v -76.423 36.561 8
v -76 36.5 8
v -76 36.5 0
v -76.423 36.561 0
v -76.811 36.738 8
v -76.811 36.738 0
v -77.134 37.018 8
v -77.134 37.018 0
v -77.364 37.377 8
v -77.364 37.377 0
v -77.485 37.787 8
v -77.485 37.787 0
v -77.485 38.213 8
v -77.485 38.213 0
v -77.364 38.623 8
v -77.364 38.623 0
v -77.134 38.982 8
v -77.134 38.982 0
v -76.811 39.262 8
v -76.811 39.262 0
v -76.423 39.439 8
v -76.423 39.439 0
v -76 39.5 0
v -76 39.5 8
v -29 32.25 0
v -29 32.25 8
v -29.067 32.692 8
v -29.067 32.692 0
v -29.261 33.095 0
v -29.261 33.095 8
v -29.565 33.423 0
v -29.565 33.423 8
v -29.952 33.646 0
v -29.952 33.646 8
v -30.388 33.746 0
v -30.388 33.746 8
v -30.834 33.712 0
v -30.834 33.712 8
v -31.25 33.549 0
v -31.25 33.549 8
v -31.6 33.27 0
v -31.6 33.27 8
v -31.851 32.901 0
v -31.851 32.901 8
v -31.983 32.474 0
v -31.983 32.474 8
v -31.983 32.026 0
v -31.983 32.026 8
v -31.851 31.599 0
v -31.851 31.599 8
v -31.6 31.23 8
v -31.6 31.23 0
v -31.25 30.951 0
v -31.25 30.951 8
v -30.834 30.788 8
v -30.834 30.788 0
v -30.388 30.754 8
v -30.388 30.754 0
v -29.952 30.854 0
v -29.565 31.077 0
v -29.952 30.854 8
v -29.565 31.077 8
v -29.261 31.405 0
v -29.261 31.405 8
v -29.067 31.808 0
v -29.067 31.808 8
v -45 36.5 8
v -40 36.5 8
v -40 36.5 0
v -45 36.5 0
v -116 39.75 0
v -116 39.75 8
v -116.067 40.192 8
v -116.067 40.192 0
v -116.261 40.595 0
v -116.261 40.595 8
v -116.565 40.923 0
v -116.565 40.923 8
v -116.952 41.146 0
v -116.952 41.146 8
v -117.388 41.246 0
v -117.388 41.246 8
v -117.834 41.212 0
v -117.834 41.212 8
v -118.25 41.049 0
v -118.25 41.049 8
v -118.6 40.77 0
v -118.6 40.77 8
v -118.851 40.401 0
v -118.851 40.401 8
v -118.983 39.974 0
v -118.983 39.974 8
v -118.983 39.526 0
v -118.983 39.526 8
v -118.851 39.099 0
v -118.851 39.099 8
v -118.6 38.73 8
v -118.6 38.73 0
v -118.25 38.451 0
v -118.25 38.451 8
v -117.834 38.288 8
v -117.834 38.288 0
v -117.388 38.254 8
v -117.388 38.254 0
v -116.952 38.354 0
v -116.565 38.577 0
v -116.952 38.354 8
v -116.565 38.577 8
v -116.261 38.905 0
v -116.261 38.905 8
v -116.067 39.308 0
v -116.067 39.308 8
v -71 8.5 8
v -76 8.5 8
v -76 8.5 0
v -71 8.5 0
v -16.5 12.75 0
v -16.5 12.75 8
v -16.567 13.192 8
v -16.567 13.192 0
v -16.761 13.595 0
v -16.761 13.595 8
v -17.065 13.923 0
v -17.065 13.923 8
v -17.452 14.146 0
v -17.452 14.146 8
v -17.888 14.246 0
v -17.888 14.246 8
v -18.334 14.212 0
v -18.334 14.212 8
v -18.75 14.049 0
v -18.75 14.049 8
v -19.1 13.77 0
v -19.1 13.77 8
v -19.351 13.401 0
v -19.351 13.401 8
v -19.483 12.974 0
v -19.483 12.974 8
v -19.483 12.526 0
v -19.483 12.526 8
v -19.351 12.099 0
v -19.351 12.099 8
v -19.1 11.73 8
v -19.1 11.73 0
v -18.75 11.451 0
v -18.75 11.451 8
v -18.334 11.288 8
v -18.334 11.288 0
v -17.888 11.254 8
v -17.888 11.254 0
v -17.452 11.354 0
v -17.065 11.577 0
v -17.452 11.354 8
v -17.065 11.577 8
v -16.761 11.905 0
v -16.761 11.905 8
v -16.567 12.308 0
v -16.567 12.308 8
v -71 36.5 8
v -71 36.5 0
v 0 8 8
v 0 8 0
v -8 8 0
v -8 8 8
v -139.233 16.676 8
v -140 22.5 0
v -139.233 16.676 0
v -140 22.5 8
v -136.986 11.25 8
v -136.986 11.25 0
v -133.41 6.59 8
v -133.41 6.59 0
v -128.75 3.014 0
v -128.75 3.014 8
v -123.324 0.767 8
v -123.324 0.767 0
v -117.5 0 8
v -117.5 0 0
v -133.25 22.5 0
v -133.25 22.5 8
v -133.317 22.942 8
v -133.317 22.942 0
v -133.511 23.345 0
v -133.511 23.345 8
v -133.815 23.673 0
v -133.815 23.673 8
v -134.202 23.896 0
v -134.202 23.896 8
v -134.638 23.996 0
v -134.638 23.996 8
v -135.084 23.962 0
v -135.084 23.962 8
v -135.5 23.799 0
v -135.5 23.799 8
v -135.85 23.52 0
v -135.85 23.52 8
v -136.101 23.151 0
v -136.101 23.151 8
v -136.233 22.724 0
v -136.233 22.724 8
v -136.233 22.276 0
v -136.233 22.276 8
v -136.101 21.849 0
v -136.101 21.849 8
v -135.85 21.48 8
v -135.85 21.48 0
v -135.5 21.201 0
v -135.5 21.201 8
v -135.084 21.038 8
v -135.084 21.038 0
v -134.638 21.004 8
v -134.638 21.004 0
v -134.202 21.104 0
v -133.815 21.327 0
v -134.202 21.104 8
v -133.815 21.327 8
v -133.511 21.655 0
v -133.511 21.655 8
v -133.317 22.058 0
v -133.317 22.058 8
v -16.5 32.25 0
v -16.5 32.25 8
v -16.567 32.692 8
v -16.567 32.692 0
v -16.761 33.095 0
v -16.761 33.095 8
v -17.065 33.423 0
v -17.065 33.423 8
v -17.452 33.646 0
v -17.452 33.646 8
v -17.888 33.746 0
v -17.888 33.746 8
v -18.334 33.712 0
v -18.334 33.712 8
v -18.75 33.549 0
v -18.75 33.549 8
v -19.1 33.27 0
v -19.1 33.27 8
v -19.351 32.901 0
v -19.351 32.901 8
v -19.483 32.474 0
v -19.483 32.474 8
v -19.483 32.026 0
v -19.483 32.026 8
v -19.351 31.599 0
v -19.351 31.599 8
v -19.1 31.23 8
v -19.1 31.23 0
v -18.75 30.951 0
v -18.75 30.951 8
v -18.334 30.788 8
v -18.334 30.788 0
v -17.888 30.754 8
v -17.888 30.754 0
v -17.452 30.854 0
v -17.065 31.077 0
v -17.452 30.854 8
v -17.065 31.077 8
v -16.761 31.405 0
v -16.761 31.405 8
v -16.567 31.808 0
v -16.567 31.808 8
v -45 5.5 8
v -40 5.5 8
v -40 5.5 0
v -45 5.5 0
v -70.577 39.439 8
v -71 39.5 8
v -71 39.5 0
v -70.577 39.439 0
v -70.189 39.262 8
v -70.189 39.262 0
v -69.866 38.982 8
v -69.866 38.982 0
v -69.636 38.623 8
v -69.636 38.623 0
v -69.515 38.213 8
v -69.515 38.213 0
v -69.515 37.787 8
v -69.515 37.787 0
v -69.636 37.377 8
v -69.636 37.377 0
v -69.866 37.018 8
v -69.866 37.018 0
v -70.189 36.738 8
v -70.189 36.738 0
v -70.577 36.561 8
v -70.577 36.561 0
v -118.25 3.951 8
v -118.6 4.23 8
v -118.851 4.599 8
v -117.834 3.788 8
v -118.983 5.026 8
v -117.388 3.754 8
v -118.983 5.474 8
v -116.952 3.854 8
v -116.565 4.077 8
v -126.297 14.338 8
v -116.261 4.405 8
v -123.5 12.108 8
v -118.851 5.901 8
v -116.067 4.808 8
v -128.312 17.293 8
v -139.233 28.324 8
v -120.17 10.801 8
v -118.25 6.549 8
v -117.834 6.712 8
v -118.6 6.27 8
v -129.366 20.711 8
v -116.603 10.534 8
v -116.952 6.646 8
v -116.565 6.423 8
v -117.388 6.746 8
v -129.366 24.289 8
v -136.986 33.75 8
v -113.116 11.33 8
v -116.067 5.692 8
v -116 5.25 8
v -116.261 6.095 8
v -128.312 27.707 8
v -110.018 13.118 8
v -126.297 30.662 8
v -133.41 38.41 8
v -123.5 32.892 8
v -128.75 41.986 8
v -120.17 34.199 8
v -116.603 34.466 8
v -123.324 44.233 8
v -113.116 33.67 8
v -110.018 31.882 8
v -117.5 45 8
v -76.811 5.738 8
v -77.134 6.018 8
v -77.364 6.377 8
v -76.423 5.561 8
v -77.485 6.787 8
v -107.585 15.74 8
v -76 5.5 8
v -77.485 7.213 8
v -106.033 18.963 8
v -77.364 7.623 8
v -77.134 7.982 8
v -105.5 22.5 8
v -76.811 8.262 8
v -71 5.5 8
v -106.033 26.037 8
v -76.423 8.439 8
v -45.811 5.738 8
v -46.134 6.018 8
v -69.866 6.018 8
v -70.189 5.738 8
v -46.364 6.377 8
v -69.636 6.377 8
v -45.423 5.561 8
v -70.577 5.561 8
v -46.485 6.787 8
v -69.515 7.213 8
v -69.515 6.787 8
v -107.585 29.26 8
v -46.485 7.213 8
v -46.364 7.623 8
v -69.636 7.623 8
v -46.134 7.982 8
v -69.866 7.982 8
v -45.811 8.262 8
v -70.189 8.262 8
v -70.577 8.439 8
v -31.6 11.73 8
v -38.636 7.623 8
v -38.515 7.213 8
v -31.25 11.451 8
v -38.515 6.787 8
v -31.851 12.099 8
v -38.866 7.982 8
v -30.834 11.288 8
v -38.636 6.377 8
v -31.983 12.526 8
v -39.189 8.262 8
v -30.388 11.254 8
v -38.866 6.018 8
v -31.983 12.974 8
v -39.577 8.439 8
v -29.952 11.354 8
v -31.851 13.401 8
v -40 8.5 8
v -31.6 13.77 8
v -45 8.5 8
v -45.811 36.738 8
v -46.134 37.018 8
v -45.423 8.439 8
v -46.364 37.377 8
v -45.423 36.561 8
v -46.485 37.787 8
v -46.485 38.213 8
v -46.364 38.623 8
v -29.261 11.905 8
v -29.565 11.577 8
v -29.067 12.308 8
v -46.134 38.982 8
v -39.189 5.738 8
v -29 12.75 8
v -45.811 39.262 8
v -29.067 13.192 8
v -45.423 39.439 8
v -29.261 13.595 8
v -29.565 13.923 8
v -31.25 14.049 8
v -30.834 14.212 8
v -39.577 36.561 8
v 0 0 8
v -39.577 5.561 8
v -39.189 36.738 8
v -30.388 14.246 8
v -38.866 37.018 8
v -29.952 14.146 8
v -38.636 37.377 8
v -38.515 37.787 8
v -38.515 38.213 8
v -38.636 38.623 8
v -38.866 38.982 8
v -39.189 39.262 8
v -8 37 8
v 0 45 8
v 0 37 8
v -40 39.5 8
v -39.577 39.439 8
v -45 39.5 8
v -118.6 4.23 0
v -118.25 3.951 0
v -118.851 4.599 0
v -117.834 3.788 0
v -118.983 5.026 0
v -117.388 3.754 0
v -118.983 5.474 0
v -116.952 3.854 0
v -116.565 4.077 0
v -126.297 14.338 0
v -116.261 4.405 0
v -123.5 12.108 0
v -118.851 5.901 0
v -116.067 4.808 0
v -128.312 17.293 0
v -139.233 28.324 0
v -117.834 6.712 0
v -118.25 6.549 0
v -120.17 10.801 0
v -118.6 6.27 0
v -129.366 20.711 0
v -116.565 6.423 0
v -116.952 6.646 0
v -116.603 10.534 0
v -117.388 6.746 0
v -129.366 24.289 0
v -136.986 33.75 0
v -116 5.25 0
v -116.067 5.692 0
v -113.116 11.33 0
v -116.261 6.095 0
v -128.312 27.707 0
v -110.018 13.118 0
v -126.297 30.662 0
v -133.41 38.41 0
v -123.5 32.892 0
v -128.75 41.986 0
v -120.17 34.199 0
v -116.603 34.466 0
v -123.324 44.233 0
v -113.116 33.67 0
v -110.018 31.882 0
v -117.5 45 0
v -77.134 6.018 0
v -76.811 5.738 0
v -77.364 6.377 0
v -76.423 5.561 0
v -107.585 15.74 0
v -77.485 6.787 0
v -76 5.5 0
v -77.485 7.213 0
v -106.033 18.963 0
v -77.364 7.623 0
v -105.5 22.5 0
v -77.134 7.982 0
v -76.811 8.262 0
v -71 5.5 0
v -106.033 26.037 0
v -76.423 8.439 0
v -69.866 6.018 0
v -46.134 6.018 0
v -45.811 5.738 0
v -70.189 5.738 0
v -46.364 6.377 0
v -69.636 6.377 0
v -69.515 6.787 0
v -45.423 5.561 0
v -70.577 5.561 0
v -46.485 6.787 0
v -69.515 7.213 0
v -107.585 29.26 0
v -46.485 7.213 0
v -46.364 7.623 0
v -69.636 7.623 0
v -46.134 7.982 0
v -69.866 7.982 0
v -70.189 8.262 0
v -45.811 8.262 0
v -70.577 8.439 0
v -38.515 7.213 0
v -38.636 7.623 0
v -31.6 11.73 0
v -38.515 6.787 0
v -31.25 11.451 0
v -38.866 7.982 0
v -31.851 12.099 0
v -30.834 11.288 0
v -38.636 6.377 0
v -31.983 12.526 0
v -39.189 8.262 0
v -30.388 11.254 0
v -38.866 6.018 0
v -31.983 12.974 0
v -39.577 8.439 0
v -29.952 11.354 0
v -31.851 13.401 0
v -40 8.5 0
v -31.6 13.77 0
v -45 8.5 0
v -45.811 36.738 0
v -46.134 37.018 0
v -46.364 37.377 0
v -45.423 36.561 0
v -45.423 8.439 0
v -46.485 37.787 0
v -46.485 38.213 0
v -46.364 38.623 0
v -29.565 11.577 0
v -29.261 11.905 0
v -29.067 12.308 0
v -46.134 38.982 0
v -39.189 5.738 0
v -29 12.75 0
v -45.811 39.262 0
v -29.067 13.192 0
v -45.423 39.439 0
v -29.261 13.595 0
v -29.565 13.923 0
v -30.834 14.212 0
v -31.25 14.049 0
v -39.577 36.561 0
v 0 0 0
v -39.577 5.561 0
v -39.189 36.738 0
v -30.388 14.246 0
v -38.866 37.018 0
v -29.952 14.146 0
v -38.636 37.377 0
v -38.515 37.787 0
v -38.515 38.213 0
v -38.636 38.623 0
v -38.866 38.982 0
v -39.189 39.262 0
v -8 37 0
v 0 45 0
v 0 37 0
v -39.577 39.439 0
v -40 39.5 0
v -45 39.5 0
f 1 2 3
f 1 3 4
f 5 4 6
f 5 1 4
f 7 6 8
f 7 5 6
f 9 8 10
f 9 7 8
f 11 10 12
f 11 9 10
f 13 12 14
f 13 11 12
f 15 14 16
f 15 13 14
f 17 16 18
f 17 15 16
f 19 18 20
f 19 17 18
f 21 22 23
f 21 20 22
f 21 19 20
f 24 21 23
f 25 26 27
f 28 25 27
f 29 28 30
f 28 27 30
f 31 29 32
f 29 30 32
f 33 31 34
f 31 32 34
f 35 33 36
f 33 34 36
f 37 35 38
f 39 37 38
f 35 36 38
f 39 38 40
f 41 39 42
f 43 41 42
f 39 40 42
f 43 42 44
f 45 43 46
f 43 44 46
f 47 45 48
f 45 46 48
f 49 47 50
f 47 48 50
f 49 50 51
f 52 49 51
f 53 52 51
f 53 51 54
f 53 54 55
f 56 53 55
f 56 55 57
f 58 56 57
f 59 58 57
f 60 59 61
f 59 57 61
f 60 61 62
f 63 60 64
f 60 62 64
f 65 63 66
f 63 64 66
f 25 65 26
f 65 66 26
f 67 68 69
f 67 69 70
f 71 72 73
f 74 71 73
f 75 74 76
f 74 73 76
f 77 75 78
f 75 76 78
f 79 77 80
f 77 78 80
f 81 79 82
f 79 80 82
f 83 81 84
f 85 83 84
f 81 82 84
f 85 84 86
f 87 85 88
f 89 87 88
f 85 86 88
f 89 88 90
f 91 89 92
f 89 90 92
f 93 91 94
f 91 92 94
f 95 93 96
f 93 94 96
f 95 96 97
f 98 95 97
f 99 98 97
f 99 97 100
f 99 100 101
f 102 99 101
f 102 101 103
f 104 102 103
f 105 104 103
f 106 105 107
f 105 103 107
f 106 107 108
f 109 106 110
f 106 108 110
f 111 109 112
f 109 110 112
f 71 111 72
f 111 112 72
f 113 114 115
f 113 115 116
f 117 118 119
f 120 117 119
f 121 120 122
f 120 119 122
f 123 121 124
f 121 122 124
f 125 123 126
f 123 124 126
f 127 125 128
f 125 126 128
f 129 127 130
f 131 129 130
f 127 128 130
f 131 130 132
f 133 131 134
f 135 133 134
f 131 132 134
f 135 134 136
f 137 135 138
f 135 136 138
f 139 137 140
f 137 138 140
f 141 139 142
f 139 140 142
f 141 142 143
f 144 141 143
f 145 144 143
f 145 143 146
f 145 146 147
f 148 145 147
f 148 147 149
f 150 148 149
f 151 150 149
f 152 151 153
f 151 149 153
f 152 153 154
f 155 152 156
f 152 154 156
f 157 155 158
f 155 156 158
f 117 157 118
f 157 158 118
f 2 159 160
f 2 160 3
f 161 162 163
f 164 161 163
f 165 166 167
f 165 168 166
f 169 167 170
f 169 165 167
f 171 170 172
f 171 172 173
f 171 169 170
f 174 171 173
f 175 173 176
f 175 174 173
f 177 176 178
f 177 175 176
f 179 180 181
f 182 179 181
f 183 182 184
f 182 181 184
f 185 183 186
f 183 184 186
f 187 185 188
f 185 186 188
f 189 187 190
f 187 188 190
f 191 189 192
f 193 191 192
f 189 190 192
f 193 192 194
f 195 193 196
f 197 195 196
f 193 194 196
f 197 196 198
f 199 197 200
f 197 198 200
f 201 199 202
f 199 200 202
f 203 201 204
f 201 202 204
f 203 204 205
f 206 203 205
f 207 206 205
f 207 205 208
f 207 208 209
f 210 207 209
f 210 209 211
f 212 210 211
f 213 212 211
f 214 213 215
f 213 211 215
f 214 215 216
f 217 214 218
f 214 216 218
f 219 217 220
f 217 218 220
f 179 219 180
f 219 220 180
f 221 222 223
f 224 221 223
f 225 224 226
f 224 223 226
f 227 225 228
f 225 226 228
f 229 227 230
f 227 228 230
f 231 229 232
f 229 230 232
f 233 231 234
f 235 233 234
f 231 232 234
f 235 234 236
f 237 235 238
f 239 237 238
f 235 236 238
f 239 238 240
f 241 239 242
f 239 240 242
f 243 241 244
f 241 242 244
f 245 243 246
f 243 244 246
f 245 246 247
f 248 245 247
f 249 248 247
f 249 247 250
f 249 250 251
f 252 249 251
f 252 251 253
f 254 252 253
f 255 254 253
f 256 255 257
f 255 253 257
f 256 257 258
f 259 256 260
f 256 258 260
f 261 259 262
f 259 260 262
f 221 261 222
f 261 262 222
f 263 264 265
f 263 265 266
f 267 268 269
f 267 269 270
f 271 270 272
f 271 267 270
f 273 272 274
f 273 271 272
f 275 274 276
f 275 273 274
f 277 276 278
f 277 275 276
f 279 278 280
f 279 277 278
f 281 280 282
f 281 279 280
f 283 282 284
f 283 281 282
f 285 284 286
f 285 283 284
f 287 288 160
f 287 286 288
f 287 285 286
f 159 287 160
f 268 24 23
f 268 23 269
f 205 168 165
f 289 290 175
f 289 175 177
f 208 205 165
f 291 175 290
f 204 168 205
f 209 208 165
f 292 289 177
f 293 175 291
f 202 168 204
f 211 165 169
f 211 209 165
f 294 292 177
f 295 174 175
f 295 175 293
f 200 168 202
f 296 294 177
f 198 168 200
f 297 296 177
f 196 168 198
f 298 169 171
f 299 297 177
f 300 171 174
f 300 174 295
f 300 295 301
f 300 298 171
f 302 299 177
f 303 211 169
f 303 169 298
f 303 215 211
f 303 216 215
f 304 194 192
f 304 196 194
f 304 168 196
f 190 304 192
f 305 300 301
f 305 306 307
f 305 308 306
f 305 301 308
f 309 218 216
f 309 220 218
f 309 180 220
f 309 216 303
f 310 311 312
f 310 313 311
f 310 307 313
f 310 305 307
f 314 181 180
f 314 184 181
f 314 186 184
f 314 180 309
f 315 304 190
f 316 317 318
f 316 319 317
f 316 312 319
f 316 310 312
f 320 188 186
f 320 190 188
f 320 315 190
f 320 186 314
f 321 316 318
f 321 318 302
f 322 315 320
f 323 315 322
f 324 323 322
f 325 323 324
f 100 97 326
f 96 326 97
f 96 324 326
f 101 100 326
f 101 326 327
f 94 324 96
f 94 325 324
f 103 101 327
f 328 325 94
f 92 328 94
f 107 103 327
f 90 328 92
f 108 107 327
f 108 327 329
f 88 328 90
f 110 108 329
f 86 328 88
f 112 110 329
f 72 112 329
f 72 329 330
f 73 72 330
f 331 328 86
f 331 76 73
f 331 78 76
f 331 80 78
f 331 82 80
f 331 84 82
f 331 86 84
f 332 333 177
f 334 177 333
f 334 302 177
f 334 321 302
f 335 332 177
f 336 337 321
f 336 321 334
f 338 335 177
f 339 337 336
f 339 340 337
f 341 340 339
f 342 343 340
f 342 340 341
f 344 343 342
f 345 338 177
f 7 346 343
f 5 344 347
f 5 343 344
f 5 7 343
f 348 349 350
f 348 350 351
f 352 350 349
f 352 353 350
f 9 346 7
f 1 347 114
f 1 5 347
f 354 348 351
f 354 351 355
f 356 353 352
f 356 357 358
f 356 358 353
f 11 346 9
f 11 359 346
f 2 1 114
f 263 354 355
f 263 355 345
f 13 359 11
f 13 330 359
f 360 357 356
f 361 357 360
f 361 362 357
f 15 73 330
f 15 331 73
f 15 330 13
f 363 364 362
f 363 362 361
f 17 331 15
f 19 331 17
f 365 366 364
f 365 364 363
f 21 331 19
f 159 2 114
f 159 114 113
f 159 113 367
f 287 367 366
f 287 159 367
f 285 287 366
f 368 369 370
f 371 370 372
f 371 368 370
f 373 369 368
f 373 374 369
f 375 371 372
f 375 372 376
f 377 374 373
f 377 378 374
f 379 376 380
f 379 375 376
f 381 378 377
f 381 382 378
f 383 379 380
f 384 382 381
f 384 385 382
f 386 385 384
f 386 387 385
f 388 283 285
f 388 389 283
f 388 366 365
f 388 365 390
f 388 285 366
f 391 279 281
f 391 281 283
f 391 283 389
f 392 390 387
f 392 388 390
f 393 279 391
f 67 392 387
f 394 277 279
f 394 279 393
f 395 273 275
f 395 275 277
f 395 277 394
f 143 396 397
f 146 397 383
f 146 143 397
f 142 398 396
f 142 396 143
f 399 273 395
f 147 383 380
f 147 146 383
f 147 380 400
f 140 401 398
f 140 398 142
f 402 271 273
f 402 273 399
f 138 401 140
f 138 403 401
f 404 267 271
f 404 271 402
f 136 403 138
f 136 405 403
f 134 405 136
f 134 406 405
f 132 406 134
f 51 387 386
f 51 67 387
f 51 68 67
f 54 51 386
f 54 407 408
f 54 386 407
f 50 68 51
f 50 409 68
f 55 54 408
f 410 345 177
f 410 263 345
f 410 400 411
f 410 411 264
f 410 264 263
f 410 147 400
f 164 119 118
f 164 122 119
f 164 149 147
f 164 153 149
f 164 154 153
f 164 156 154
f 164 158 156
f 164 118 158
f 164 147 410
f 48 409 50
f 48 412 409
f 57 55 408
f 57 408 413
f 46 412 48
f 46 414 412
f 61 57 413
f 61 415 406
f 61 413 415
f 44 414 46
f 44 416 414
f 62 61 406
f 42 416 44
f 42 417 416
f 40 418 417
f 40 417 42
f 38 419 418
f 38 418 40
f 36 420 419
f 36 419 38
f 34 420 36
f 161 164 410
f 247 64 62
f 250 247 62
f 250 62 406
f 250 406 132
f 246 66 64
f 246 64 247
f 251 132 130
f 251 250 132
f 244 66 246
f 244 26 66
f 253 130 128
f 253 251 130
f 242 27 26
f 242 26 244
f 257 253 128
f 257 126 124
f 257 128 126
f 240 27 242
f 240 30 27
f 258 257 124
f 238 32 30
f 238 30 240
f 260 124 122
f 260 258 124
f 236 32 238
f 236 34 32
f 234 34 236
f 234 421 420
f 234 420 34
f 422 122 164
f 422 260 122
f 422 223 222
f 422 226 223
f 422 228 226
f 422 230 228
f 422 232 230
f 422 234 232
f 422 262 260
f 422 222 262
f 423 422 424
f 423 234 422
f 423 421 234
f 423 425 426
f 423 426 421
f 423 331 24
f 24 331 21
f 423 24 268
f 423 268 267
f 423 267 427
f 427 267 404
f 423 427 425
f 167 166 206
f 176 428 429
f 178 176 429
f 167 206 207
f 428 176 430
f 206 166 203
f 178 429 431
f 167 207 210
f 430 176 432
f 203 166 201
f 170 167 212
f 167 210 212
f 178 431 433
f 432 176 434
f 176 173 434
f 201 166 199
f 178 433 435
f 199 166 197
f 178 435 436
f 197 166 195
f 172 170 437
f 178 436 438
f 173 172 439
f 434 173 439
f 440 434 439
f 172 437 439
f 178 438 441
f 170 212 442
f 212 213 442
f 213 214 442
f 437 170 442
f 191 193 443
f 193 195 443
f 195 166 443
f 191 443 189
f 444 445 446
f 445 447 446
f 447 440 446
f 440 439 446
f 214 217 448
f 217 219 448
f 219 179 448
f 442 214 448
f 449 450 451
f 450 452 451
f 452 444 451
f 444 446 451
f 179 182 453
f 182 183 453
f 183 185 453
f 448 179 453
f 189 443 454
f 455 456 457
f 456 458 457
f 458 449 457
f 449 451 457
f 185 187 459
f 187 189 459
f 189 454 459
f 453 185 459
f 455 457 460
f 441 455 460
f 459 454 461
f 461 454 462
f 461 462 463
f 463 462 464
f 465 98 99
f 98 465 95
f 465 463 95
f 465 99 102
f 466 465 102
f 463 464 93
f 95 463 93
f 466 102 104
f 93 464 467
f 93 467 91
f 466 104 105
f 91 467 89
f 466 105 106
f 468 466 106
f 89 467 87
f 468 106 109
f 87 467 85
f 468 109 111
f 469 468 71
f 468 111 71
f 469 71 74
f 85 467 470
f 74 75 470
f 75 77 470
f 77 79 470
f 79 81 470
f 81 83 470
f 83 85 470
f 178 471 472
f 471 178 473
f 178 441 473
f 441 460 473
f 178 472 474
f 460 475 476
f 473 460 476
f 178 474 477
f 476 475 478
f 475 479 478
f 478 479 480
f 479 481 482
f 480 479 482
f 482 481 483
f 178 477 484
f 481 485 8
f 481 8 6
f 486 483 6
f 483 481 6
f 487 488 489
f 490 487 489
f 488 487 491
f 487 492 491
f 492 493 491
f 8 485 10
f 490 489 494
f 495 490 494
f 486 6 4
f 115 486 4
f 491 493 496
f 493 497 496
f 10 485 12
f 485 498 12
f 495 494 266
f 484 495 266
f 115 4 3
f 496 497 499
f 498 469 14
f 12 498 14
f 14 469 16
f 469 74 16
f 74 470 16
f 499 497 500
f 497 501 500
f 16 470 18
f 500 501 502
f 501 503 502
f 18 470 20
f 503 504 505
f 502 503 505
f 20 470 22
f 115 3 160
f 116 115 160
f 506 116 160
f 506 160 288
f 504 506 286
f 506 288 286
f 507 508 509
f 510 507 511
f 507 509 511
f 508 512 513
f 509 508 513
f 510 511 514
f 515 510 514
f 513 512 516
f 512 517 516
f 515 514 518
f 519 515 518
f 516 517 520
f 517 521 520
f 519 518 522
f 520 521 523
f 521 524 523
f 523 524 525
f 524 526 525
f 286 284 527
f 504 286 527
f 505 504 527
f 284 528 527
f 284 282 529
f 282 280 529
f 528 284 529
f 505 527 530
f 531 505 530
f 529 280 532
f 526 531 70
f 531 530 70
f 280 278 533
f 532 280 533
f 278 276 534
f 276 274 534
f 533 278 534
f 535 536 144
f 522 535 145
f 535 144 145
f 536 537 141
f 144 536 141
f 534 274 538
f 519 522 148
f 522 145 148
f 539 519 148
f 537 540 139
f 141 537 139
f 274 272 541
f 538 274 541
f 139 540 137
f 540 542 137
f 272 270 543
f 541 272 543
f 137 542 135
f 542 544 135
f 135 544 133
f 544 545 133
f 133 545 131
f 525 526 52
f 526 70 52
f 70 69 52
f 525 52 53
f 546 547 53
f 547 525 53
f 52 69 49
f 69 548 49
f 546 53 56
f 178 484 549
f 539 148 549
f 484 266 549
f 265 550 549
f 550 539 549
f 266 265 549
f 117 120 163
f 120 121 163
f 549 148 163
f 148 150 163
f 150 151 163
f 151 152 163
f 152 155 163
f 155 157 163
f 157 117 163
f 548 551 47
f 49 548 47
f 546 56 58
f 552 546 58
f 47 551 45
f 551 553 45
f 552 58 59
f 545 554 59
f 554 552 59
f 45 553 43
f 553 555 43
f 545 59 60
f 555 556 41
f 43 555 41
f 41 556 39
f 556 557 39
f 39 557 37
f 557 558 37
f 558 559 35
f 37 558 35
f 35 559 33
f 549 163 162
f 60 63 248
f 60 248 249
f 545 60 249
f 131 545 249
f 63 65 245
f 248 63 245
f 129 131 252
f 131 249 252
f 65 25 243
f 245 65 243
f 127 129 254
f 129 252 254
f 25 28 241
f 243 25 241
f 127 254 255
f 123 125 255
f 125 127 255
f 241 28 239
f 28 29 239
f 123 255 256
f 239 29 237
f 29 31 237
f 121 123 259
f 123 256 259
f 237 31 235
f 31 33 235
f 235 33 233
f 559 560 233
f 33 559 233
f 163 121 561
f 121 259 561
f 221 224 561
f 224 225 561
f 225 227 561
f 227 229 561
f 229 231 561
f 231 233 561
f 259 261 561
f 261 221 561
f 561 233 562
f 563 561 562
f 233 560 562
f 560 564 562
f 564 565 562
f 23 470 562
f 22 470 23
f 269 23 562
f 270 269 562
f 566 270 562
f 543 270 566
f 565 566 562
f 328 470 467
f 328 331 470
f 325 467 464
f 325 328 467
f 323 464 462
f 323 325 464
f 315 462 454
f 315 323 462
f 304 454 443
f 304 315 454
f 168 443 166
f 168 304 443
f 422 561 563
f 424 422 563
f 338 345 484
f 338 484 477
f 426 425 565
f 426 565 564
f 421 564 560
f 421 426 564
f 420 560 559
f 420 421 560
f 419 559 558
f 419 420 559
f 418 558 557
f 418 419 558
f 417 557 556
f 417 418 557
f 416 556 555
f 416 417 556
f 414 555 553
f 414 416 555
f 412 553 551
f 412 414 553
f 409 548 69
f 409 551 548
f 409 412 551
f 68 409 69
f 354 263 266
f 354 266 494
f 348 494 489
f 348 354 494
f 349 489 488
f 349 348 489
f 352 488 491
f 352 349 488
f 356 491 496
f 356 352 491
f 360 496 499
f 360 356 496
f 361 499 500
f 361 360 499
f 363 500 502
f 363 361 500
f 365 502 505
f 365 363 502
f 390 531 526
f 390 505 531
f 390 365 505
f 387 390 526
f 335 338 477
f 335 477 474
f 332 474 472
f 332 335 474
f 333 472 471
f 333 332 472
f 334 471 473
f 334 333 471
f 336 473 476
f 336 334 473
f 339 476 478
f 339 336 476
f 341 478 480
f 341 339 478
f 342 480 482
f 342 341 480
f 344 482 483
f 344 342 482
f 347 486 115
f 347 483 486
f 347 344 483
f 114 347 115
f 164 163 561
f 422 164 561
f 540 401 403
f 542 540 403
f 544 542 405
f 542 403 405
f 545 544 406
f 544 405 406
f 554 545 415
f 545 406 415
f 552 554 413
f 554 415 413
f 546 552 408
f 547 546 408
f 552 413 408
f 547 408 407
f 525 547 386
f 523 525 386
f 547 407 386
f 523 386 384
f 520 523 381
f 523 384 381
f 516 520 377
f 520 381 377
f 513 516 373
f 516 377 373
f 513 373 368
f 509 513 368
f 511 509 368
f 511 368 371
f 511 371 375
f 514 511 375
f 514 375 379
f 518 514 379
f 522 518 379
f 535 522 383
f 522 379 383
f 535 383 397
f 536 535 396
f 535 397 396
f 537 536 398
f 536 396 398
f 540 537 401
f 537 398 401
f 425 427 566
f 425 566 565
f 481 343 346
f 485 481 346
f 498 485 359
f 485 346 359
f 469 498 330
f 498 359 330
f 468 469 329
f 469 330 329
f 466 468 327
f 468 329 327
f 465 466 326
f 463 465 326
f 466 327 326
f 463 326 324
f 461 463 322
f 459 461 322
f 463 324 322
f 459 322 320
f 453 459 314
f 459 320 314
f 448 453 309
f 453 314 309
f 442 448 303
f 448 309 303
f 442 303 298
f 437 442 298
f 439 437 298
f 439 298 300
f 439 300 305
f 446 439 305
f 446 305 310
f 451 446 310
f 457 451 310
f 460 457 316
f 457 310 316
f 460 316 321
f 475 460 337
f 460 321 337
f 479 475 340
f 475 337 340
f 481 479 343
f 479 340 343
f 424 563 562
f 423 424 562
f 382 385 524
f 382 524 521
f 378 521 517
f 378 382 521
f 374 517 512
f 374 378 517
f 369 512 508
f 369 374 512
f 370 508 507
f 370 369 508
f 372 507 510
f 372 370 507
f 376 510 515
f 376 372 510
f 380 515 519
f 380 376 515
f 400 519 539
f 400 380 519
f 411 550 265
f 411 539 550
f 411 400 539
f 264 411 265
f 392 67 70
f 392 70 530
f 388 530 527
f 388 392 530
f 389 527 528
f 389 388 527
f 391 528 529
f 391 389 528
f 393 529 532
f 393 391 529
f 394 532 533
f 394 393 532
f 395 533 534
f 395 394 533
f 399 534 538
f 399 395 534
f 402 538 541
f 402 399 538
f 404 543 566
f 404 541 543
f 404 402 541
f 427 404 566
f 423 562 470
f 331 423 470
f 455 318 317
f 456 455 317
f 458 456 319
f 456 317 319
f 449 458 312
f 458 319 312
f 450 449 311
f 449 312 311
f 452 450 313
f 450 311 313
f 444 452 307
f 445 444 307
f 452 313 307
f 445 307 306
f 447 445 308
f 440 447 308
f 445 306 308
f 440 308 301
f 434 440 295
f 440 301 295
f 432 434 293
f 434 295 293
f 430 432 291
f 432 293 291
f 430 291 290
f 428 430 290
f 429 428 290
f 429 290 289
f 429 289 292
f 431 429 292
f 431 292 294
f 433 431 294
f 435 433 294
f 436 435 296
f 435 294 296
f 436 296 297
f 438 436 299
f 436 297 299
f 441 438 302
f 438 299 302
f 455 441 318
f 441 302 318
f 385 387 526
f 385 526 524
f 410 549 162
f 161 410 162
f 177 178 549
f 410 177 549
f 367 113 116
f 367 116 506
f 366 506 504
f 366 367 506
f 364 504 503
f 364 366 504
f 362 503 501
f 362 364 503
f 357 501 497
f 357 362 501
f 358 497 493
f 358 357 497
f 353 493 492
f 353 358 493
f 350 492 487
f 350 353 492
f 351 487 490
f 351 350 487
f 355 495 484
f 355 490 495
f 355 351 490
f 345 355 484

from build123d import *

# Parameters (mm, degrees)
BOSS_EXTRUDE1_DEPTH = 8
SKETCH5_R           = 12
CUT_EXTRUDE4_DEPTH  = 8
FILLET6_R           = 22.5
SKETCH6_R           = 1.5
CUT_EXTRUDE5_DEPTH  = 8
CUT_EXTRUDE6_DEPTH  = 10
SKETCH11_R          = 1.5
CUT_EXTRUDE7_DEPTH  = 8


with BuildPart() as part:
    # Sketch1 → Boss-Extrude1 (new body)
    with BuildSketch(Plane.XY):
        Polygon((-8, 37), (0, 37), (0, 45), (-140, 45), (-140, 22.5), (-140, 0), (0, 0), (0, 8), (-8, 8), align=None)
    extrude(amount=BOSS_EXTRUDE1_DEPTH)

    # Sketch5 → Cut-Extrude4 (cut)
    with BuildSketch(Plane.XY.offset(8)):
        with Locations((-117.5, 22.5)):
            Circle(SKETCH5_R)
    extrude(amount=-CUT_EXTRUDE4_DEPTH, mode=Mode.SUBTRACT)

    # Fillet6
    fillet6_edges = [part.edges().sort_by_distance(p)[0] for p in [
        (-140, 45, 4),
        (-140, 0, 4),
    ]]
    fillet(fillet6_edges, radius=FILLET6_R - 0.0001)  # a hair under: the kernel refuses the full size

    # Sketch6 → Cut-Extrude5 (cut)
    with BuildSketch(Plane.XY.offset(8)):
        with Locations((-18, 12.75)):
            Circle(SKETCH6_R)
        with Locations((-18, 32.25)):
            Circle(SKETCH6_R)
        with Locations((-30.5, 32.25)):
            Circle(SKETCH6_R)
        with Locations((-30.5, 12.75)):
            Circle(SKETCH6_R)
    extrude(amount=-CUT_EXTRUDE5_DEPTH, mode=Mode.SUBTRACT)

    # Sketch7 → Cut-Extrude6 (cut)
    with BuildSketch(Plane.XY.offset(8)):
        with BuildLine():
            Line((-76, 39.5), (-71, 39.5))
            ThreePointArc((-71, 39.5), (-69.5, 38), (-71, 36.5))
            Line((-71, 36.5), (-76, 36.5))
            ThreePointArc((-76, 36.5), (-77.5, 38), (-76, 39.5))
        make_face()
        with BuildLine():
            Line((-45, 39.5), (-40, 39.5))
            ThreePointArc((-40, 39.5), (-38.5, 38), (-40, 36.5))
            Line((-40, 36.5), (-45, 36.5))
            ThreePointArc((-45, 36.5), (-46.5, 38), (-45, 39.5))
        make_face()
        with BuildLine():
            Line((-45, 8.5), (-40, 8.5))
            ThreePointArc((-40, 8.5), (-38.5, 7), (-40, 5.5))
            Line((-40, 5.5), (-45, 5.5))
            ThreePointArc((-45, 5.5), (-46.5, 7), (-45, 8.5))
        make_face()
        with BuildLine():
            Line((-76, 8.5), (-71, 8.5))
            ThreePointArc((-71, 8.5), (-69.5, 7), (-71, 5.5))
            Line((-71, 5.5), (-76, 5.5))
            ThreePointArc((-76, 5.5), (-77.5, 7), (-76, 8.5))
        make_face()
    extrude(amount=-CUT_EXTRUDE6_DEPTH, mode=Mode.SUBTRACT)

    # Sketch11 → Cut-Extrude7 (cut)
    with BuildSketch(Plane.XY.offset(8)):
        with Locations((-134.75, 22.5)):
            Circle(SKETCH11_R)
        with Locations((-117.5, 5.25)):
            Circle(SKETCH11_R)
        with Locations((-117.5, 39.75)):
            Circle(SKETCH11_R)
    extrude(amount=-CUT_EXTRUDE7_DEPTH, mode=Mode.SUBTRACT)


solid = part.part
